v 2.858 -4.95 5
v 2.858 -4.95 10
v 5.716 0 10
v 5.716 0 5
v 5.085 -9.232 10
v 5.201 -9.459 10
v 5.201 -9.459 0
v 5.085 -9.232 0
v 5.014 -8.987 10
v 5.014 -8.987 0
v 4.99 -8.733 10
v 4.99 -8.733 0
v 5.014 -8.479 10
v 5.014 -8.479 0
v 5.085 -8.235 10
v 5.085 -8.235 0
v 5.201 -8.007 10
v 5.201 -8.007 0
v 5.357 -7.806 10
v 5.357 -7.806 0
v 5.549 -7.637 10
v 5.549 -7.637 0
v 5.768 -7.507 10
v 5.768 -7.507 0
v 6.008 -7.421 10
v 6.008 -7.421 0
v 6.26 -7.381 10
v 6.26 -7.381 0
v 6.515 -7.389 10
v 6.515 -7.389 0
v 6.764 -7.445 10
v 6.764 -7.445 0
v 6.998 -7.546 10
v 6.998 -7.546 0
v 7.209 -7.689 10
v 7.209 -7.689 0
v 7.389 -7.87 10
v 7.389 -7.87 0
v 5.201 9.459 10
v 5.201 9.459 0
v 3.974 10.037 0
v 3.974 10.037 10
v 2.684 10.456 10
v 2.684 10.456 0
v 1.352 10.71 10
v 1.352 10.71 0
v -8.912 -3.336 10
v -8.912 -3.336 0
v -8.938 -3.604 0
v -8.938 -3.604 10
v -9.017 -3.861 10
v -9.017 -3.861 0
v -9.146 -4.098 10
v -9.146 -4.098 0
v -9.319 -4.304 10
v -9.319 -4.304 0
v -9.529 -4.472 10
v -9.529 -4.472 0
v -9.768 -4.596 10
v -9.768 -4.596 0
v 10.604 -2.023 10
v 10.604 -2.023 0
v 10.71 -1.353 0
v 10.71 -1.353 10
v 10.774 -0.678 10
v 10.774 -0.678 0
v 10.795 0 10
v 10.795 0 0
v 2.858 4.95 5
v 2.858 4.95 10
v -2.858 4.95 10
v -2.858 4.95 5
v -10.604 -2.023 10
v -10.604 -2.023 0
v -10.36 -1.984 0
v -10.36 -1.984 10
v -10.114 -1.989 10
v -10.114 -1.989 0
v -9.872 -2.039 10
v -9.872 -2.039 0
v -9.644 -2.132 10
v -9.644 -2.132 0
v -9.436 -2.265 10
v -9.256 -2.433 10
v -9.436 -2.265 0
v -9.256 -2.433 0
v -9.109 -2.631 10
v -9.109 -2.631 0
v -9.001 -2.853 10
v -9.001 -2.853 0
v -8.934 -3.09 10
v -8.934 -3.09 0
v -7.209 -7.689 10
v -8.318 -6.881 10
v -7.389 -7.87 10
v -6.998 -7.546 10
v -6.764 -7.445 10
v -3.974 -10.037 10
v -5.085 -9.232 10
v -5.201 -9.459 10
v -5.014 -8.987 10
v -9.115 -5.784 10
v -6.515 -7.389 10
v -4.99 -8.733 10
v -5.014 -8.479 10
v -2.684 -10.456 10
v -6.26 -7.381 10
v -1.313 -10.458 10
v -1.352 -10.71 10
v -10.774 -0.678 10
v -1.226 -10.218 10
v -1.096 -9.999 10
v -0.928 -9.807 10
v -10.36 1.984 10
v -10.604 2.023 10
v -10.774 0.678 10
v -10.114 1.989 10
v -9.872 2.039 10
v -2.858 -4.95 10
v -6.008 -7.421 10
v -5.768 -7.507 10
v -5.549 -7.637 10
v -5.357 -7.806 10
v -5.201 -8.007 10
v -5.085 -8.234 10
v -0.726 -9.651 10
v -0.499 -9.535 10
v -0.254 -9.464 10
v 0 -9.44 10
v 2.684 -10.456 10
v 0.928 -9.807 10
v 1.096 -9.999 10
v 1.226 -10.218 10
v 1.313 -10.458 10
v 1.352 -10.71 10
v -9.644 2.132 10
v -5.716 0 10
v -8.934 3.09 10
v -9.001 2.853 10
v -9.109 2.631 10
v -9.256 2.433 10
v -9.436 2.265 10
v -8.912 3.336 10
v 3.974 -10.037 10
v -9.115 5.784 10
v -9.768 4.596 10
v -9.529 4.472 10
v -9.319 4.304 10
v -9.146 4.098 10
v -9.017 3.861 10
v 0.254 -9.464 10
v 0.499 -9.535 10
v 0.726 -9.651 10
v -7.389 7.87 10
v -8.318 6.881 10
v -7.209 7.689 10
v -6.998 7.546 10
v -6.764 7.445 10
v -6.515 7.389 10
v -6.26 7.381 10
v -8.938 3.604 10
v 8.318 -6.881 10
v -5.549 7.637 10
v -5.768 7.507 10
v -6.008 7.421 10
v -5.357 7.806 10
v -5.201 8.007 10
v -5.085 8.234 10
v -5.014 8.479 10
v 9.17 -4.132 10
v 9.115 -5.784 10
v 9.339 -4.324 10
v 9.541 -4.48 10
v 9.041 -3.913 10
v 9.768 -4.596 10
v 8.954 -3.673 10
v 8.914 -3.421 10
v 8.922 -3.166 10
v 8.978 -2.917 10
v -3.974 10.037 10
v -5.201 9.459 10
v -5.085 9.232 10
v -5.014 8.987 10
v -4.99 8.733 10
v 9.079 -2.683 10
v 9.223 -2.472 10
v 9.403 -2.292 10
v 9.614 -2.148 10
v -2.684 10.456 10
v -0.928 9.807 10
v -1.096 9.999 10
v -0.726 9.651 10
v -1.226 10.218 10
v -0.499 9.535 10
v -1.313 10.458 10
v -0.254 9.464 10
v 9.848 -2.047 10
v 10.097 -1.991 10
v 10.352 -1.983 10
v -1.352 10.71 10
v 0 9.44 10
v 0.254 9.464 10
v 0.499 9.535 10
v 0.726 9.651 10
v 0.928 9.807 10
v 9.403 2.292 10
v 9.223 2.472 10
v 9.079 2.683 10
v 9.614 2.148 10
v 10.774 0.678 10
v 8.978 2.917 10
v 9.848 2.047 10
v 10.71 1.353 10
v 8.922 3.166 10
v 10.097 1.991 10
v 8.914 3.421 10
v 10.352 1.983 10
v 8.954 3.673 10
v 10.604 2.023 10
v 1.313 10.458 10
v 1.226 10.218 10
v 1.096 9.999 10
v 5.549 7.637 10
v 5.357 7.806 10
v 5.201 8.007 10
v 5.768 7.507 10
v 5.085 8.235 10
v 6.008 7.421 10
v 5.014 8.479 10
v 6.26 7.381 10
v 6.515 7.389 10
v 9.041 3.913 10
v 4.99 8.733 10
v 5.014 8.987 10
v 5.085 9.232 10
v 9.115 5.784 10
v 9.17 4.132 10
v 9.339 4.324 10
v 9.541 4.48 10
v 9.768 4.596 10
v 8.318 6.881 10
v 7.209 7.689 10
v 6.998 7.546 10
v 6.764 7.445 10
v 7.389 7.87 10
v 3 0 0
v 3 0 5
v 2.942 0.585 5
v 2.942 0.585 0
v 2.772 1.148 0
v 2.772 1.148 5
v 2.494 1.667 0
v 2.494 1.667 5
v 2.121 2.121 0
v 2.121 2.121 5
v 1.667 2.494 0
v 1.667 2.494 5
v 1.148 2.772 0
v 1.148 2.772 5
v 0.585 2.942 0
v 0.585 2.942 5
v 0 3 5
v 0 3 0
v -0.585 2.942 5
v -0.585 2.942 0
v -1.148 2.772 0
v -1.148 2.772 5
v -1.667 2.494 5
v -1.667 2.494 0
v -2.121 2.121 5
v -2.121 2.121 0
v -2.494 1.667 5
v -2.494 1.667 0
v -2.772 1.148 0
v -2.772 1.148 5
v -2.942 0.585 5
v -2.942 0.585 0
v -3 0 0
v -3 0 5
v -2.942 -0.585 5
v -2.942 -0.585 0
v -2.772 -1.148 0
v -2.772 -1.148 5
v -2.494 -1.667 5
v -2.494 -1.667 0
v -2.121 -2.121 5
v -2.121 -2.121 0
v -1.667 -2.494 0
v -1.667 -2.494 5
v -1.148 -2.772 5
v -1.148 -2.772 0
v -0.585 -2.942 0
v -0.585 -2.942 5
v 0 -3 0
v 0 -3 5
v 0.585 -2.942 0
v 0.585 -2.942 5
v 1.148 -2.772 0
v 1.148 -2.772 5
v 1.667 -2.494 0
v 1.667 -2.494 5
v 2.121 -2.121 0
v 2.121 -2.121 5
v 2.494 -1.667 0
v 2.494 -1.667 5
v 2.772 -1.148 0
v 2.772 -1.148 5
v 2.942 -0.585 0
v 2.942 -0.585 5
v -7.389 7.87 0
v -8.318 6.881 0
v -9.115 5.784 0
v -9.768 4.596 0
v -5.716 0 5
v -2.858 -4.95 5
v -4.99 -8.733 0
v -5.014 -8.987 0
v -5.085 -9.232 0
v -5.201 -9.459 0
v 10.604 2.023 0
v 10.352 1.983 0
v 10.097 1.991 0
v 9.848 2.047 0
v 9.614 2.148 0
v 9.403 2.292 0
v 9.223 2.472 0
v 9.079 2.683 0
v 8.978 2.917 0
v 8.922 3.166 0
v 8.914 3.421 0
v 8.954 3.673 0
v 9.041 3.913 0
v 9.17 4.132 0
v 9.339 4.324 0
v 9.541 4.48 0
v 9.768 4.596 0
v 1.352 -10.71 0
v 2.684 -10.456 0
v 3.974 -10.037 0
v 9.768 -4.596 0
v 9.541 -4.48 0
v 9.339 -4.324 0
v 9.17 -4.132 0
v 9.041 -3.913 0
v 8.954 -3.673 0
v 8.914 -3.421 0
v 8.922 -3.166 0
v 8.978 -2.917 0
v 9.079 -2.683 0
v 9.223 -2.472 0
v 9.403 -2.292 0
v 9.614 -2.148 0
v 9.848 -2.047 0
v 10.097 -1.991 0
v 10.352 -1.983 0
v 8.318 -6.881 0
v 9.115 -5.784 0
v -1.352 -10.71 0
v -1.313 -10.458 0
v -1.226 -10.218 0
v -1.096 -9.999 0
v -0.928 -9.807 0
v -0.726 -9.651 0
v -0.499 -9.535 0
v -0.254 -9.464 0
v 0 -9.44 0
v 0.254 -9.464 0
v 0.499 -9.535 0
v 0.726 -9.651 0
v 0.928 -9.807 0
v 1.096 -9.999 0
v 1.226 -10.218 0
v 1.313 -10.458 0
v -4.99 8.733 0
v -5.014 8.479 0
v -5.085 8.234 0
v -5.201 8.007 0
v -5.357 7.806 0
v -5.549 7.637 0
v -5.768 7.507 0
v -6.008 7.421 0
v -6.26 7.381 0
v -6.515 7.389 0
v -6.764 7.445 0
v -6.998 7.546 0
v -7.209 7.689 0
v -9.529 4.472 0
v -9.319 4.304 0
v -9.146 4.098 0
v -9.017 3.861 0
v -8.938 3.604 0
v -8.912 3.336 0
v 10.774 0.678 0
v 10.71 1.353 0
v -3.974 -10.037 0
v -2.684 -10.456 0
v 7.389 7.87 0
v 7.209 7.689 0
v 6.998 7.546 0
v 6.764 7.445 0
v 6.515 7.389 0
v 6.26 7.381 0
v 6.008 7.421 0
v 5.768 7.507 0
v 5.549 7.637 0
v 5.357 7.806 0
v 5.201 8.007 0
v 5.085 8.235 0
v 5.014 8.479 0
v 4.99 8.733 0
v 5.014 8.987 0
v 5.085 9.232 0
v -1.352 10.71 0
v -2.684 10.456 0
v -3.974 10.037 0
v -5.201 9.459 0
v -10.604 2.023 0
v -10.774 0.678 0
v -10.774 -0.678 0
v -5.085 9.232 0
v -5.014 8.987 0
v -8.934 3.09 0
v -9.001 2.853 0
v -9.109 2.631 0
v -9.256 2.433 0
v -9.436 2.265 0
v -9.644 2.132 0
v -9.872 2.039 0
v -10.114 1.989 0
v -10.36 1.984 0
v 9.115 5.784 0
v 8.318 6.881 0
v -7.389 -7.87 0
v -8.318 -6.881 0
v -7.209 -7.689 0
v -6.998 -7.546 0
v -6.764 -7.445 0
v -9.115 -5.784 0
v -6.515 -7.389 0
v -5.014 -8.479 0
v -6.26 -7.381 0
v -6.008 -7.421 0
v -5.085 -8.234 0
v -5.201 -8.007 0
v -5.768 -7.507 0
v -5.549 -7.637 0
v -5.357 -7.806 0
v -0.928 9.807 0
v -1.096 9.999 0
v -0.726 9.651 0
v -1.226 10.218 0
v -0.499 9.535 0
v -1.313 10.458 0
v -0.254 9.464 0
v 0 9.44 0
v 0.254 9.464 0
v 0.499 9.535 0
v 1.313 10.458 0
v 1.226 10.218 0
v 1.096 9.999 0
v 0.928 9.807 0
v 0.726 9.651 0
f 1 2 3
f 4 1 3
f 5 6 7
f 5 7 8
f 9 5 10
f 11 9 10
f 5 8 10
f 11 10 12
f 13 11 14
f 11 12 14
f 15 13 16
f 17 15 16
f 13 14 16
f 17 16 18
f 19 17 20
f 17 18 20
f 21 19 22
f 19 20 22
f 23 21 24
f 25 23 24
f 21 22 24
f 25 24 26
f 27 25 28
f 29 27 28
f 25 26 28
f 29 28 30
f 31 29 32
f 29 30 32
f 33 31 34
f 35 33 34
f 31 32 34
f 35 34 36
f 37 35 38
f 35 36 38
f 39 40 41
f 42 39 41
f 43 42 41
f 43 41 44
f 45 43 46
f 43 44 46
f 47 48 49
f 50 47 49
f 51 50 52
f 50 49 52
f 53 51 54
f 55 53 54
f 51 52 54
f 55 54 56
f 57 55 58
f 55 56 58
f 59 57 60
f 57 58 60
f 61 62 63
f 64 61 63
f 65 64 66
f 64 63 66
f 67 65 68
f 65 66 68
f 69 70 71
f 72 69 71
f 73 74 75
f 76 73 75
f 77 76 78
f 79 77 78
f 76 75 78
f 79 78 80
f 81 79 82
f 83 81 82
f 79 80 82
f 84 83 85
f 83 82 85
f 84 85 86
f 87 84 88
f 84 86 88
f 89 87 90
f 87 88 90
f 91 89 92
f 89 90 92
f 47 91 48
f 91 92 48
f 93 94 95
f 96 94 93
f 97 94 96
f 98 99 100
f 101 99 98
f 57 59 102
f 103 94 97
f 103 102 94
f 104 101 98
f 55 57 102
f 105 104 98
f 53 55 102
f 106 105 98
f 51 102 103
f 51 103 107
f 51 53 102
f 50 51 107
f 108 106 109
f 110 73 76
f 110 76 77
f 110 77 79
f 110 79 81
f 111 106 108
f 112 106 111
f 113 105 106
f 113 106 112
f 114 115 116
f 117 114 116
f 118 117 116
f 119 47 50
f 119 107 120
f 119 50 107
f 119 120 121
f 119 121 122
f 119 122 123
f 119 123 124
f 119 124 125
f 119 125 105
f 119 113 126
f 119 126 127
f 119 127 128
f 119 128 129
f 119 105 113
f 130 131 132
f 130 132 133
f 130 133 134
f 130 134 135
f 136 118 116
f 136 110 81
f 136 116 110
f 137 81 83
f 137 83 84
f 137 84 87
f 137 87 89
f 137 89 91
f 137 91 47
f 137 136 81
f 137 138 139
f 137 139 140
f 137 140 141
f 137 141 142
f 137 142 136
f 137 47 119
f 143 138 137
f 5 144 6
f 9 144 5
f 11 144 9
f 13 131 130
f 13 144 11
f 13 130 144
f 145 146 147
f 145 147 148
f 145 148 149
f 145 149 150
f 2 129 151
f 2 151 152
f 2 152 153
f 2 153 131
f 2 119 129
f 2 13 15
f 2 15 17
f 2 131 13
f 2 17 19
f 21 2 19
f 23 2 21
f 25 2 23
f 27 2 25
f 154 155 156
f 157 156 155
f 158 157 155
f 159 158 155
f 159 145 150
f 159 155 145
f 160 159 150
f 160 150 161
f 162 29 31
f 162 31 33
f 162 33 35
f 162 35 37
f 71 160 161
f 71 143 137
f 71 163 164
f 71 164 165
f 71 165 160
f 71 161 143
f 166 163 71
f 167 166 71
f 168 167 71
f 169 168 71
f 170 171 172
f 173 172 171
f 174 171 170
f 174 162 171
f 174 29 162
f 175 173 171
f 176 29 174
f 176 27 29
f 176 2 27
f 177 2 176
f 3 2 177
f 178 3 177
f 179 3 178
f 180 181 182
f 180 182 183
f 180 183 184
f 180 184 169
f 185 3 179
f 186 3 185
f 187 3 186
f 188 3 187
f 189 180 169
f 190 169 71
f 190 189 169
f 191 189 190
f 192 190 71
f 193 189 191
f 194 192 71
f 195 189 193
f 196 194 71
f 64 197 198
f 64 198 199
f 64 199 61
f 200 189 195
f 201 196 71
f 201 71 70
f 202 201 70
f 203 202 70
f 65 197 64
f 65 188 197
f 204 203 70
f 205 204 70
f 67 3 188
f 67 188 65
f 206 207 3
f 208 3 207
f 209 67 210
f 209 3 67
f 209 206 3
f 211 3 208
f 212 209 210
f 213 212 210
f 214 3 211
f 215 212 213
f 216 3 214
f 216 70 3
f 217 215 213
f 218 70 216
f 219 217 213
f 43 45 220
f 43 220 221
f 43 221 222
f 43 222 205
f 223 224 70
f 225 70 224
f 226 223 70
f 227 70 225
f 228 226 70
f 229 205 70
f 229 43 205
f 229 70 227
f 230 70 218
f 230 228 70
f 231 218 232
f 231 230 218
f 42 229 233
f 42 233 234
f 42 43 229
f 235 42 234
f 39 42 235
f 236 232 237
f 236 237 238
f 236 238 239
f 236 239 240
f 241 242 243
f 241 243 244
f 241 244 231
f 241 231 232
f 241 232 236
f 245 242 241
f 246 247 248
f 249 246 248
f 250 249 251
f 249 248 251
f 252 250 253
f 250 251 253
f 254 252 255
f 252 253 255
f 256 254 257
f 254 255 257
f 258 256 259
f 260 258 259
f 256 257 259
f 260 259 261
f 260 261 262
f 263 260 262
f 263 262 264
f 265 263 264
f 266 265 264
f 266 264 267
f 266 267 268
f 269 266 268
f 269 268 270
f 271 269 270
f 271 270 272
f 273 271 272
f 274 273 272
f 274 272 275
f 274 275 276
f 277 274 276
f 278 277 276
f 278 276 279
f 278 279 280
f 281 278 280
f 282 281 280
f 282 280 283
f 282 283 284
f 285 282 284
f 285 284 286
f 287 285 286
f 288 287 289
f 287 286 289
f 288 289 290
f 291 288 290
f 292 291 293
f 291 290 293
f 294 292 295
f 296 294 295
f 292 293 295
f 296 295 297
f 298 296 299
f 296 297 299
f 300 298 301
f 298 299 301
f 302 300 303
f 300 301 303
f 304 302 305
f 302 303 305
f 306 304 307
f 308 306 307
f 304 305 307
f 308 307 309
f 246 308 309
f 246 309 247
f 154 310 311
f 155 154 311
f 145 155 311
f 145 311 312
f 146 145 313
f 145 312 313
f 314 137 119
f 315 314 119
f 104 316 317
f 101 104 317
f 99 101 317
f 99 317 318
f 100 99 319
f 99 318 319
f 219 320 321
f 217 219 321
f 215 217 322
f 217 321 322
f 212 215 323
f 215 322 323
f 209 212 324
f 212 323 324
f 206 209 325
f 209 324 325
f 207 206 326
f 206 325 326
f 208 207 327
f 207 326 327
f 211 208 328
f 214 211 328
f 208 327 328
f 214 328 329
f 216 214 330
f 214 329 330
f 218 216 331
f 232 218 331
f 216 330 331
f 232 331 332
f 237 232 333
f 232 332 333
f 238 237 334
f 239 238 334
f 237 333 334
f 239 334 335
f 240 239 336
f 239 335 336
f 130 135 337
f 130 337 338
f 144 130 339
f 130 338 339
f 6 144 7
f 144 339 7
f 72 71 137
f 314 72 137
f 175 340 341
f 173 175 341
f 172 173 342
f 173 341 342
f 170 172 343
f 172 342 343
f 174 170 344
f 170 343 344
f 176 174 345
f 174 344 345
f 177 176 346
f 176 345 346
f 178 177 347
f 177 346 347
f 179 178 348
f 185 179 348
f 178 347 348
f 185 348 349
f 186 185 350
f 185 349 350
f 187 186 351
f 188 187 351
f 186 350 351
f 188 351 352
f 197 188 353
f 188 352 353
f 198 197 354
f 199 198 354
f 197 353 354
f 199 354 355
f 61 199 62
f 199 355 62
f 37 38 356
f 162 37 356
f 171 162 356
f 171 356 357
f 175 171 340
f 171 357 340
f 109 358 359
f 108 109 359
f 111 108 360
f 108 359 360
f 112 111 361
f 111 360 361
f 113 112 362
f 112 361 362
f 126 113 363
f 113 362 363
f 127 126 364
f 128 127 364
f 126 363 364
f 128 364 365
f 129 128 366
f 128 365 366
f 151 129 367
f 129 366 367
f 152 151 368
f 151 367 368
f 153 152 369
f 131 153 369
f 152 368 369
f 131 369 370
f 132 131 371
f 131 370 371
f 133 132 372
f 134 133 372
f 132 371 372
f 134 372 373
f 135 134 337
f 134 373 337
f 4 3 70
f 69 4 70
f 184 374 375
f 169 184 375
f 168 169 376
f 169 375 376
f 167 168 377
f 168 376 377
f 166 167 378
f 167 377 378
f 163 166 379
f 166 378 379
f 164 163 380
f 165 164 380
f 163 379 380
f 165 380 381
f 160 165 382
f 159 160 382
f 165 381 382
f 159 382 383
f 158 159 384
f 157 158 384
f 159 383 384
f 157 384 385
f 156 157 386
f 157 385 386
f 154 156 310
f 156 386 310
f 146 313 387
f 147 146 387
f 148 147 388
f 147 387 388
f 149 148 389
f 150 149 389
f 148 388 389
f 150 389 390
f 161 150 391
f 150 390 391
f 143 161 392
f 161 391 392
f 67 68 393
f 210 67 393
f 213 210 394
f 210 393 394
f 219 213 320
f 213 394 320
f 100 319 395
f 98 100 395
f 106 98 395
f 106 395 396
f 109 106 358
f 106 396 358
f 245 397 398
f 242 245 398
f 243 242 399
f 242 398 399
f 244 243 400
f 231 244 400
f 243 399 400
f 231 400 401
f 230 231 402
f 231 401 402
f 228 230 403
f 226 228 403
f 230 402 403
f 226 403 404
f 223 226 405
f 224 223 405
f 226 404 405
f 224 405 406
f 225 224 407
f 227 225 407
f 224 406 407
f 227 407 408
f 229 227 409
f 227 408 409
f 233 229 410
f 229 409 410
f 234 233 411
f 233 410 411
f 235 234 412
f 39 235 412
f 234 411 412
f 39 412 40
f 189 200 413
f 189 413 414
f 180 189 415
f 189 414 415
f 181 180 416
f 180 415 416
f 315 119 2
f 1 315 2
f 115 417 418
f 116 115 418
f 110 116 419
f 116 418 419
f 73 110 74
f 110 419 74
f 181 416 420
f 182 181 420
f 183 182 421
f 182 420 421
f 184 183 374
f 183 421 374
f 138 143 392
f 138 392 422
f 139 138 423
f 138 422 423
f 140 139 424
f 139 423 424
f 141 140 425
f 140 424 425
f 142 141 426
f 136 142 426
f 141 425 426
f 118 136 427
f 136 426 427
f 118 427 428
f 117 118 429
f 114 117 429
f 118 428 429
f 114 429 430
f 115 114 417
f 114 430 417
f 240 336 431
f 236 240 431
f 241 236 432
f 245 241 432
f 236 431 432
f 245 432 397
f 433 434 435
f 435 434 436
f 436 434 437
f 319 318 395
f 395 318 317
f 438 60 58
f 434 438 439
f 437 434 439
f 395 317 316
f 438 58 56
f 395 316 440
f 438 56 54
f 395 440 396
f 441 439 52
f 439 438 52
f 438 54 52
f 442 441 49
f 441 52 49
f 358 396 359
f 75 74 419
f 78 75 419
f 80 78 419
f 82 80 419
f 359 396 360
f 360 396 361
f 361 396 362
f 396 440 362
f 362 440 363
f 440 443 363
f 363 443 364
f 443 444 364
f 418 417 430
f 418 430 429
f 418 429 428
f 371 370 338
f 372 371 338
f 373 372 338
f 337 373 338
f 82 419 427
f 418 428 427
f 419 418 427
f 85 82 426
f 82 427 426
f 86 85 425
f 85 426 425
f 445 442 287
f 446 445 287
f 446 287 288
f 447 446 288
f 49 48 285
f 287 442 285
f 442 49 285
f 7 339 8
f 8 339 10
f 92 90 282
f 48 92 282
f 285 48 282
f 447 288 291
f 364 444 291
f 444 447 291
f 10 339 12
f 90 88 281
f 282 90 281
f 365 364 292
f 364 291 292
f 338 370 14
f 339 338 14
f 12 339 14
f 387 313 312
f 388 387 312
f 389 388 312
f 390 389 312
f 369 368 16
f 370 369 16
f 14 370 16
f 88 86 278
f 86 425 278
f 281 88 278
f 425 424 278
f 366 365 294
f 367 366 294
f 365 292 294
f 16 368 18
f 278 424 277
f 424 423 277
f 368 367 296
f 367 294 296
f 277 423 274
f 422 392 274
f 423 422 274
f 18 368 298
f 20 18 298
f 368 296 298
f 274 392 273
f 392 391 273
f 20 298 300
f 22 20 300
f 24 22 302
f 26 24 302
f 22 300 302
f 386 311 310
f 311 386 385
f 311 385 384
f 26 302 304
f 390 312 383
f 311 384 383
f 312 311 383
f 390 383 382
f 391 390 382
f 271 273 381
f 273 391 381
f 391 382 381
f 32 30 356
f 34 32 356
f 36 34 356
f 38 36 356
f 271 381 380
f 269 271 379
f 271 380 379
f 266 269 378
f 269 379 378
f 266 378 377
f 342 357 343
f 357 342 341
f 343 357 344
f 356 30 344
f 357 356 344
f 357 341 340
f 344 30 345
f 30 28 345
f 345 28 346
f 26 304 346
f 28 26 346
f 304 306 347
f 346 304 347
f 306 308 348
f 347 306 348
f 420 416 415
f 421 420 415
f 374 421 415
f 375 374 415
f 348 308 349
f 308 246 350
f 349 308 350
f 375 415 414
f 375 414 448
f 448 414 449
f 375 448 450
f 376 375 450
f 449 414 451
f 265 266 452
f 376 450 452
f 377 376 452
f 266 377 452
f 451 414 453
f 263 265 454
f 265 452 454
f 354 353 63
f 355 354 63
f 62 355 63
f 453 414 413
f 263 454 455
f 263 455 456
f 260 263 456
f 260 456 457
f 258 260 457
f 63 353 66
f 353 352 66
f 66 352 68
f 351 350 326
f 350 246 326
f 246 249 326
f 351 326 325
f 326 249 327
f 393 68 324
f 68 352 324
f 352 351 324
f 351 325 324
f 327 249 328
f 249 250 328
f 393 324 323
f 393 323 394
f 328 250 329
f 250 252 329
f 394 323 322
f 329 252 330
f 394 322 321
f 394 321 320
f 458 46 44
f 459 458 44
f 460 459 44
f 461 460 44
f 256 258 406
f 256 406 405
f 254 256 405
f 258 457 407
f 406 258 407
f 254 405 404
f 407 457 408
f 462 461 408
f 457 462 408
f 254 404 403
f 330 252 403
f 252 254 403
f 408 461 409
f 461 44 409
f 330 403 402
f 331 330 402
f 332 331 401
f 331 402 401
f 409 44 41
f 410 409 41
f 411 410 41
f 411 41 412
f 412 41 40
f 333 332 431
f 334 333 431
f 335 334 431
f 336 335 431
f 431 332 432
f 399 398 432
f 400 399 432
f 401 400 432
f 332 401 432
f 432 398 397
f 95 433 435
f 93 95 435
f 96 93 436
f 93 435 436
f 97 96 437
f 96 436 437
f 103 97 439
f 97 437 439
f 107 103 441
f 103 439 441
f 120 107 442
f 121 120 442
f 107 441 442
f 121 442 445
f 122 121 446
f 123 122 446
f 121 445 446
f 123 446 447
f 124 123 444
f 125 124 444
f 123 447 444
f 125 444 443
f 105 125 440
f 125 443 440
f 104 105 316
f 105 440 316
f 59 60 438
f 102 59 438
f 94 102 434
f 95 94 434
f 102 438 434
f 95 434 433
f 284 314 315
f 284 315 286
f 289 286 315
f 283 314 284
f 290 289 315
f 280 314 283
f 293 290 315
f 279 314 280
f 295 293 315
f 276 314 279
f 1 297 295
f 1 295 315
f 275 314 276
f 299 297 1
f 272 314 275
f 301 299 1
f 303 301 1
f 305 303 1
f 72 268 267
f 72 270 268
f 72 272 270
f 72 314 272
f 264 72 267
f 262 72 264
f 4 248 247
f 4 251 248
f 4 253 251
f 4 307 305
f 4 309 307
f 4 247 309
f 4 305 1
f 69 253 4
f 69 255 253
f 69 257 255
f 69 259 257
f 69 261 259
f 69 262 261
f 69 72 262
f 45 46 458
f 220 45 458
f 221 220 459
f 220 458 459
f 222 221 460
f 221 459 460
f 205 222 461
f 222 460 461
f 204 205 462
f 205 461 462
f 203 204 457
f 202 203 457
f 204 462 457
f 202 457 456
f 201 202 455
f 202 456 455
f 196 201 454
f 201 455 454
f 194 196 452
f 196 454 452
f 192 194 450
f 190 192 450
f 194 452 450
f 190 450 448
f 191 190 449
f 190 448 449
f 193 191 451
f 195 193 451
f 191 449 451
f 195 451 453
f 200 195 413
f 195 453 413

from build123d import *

# Parameters (mm, degrees)
F1_DEPTH = 10
F2_R     = 3
F3_DEPTH = 10.001
F4_R     = 3
F5_DEPTH = 5


with BuildPart() as f1:
    # F0 (on Top) → F1 (new body)
    with BuildSketch(Plane.XY):
        with BuildLine():
            ThreePointArc((10.6036903919, -2.023307953), (10.747066176, -1.0161661329), (10.795, 0))
            ThreePointArc((10.795, 0), (10.747066176, 1.0161661329), (10.6036903919, 2.023307953))
            ThreePointArc((10.6036903919, 2.023307953), (8.9778667931, 2.9170857512), (9.7678363058, 4.5958023134))
            ThreePointArc((9.7678363058, 4.5958023134), (8.7333384543, 6.3451417985), (7.3892951545, 7.8695833511))
            ThreePointArc((7.3892951545, 7.8695833511), (5.5486268246, 7.6370296448), (5.2010007473, 9.4594723017))
            ThreePointArc((5.2010007473, 9.4594723017), (3.3358384543, 10.2666550934), (1.352440321, 10.7099453863))
            ThreePointArc((1.352440321, 10.7099453863), (0, 9.4398877872), (-1.352440321, 10.7099453863))
            ThreePointArc((-1.352440321, 10.7099453863), (-3.3358384543, 10.2666550934), (-5.2010007473, 9.4594723017))
            ThreePointArc((-5.2010007473, 9.4594723017), (-5.0438407916, 9.1114188675), (-4.9900295857, 8.7333384543))
            ThreePointArc((-4.9900295857, 8.7333384543), (-5.8861297374, 7.4583337339), (-7.3892951545, 7.8695833511))
            ThreePointArc((-7.3892951545, 7.8695833511), (-8.7333384543, 6.3451417985), (-9.7678363058, 4.5958023134))
            ThreePointArc((-9.7678363058, 4.5958023134), (-9.1458775641, 4.0975384208), (-8.9115428806, 3.3358384543))
            ThreePointArc((-8.9115428806, 3.3358384543), (-9.4361105551, 2.2650794341), (-10.6036903919, 2.023307953))
            ThreePointArc((-10.6036903919, 2.023307953), (-10.795, 0), (-10.6036903919, -2.023307953))
            ThreePointArc((-10.6036903919, -2.023307953), (-9.4361105551, -2.2650794341), (-8.9115428806, -3.3358384543))
            ThreePointArc((-8.9115428806, -3.3358384543), (-9.1458775641, -4.0975384208), (-9.7678363058, -4.5958023134))
            ThreePointArc((-9.7678363058, -4.5958023134), (-8.7333384543, -6.3451417985), (-7.3892951545, -7.8695833511))
            ThreePointArc((-7.3892951545, -7.8695833511), (-5.8861297374, -7.4583337339), (-4.9900295857, -8.7333384543))
            ThreePointArc((-4.9900295857, -8.7333384543), (-5.0438407916, -9.1114188675), (-5.2010007473, -9.4594723017))
            ThreePointArc((-5.2010007473, -9.4594723017), (-3.3358384543, -10.2666550934), (-1.352440321, -10.7099453863))
            ThreePointArc((-1.352440321, -10.7099453863), (0, -9.4398877872), (1.352440321, -10.7099453863))
            ThreePointArc((1.352440321, -10.7099453863), (3.3358384543, -10.2666550934), (5.2010007473, -9.4594723017))
            ThreePointArc((5.2010007473, -9.4594723017), (5.5486268246, -7.6370296448), (7.3892951545, -7.8695833511))
            ThreePointArc((7.3892951545, -7.8695833511), (8.7333384543, -6.3451417985), (9.7678363058, -4.5958023134))
            ThreePointArc((9.7678363058, -4.5958023134), (8.9778667931, -2.9170857512), (10.6036903919, -2.023307953))
        make_face()
    extrude(amount=F1_DEPTH)

    # F2 (on face) → F3 (cut, through all)
    with BuildSketch(Plane.XY.offset(10)):
        Circle(F2_R)
    extrude(amount=-F3_DEPTH, mode=Mode.SUBTRACT)

    # F4 (on face) → F5 (cut)
    with BuildSketch(Plane.XY.offset(10)):
        Polygon((2.8578838325, -4.95), (5.715767665, 0), (2.8578838325, 4.95), (-2.8578838325, 4.95), (-5.715767665, 0), (-2.8578838325, -4.95), align=None)
        Circle(F4_R, mode=Mode.SUBTRACT)
    extrude(amount=-F5_DEPTH, mode=Mode.SUBTRACT)


solid = f1.part
